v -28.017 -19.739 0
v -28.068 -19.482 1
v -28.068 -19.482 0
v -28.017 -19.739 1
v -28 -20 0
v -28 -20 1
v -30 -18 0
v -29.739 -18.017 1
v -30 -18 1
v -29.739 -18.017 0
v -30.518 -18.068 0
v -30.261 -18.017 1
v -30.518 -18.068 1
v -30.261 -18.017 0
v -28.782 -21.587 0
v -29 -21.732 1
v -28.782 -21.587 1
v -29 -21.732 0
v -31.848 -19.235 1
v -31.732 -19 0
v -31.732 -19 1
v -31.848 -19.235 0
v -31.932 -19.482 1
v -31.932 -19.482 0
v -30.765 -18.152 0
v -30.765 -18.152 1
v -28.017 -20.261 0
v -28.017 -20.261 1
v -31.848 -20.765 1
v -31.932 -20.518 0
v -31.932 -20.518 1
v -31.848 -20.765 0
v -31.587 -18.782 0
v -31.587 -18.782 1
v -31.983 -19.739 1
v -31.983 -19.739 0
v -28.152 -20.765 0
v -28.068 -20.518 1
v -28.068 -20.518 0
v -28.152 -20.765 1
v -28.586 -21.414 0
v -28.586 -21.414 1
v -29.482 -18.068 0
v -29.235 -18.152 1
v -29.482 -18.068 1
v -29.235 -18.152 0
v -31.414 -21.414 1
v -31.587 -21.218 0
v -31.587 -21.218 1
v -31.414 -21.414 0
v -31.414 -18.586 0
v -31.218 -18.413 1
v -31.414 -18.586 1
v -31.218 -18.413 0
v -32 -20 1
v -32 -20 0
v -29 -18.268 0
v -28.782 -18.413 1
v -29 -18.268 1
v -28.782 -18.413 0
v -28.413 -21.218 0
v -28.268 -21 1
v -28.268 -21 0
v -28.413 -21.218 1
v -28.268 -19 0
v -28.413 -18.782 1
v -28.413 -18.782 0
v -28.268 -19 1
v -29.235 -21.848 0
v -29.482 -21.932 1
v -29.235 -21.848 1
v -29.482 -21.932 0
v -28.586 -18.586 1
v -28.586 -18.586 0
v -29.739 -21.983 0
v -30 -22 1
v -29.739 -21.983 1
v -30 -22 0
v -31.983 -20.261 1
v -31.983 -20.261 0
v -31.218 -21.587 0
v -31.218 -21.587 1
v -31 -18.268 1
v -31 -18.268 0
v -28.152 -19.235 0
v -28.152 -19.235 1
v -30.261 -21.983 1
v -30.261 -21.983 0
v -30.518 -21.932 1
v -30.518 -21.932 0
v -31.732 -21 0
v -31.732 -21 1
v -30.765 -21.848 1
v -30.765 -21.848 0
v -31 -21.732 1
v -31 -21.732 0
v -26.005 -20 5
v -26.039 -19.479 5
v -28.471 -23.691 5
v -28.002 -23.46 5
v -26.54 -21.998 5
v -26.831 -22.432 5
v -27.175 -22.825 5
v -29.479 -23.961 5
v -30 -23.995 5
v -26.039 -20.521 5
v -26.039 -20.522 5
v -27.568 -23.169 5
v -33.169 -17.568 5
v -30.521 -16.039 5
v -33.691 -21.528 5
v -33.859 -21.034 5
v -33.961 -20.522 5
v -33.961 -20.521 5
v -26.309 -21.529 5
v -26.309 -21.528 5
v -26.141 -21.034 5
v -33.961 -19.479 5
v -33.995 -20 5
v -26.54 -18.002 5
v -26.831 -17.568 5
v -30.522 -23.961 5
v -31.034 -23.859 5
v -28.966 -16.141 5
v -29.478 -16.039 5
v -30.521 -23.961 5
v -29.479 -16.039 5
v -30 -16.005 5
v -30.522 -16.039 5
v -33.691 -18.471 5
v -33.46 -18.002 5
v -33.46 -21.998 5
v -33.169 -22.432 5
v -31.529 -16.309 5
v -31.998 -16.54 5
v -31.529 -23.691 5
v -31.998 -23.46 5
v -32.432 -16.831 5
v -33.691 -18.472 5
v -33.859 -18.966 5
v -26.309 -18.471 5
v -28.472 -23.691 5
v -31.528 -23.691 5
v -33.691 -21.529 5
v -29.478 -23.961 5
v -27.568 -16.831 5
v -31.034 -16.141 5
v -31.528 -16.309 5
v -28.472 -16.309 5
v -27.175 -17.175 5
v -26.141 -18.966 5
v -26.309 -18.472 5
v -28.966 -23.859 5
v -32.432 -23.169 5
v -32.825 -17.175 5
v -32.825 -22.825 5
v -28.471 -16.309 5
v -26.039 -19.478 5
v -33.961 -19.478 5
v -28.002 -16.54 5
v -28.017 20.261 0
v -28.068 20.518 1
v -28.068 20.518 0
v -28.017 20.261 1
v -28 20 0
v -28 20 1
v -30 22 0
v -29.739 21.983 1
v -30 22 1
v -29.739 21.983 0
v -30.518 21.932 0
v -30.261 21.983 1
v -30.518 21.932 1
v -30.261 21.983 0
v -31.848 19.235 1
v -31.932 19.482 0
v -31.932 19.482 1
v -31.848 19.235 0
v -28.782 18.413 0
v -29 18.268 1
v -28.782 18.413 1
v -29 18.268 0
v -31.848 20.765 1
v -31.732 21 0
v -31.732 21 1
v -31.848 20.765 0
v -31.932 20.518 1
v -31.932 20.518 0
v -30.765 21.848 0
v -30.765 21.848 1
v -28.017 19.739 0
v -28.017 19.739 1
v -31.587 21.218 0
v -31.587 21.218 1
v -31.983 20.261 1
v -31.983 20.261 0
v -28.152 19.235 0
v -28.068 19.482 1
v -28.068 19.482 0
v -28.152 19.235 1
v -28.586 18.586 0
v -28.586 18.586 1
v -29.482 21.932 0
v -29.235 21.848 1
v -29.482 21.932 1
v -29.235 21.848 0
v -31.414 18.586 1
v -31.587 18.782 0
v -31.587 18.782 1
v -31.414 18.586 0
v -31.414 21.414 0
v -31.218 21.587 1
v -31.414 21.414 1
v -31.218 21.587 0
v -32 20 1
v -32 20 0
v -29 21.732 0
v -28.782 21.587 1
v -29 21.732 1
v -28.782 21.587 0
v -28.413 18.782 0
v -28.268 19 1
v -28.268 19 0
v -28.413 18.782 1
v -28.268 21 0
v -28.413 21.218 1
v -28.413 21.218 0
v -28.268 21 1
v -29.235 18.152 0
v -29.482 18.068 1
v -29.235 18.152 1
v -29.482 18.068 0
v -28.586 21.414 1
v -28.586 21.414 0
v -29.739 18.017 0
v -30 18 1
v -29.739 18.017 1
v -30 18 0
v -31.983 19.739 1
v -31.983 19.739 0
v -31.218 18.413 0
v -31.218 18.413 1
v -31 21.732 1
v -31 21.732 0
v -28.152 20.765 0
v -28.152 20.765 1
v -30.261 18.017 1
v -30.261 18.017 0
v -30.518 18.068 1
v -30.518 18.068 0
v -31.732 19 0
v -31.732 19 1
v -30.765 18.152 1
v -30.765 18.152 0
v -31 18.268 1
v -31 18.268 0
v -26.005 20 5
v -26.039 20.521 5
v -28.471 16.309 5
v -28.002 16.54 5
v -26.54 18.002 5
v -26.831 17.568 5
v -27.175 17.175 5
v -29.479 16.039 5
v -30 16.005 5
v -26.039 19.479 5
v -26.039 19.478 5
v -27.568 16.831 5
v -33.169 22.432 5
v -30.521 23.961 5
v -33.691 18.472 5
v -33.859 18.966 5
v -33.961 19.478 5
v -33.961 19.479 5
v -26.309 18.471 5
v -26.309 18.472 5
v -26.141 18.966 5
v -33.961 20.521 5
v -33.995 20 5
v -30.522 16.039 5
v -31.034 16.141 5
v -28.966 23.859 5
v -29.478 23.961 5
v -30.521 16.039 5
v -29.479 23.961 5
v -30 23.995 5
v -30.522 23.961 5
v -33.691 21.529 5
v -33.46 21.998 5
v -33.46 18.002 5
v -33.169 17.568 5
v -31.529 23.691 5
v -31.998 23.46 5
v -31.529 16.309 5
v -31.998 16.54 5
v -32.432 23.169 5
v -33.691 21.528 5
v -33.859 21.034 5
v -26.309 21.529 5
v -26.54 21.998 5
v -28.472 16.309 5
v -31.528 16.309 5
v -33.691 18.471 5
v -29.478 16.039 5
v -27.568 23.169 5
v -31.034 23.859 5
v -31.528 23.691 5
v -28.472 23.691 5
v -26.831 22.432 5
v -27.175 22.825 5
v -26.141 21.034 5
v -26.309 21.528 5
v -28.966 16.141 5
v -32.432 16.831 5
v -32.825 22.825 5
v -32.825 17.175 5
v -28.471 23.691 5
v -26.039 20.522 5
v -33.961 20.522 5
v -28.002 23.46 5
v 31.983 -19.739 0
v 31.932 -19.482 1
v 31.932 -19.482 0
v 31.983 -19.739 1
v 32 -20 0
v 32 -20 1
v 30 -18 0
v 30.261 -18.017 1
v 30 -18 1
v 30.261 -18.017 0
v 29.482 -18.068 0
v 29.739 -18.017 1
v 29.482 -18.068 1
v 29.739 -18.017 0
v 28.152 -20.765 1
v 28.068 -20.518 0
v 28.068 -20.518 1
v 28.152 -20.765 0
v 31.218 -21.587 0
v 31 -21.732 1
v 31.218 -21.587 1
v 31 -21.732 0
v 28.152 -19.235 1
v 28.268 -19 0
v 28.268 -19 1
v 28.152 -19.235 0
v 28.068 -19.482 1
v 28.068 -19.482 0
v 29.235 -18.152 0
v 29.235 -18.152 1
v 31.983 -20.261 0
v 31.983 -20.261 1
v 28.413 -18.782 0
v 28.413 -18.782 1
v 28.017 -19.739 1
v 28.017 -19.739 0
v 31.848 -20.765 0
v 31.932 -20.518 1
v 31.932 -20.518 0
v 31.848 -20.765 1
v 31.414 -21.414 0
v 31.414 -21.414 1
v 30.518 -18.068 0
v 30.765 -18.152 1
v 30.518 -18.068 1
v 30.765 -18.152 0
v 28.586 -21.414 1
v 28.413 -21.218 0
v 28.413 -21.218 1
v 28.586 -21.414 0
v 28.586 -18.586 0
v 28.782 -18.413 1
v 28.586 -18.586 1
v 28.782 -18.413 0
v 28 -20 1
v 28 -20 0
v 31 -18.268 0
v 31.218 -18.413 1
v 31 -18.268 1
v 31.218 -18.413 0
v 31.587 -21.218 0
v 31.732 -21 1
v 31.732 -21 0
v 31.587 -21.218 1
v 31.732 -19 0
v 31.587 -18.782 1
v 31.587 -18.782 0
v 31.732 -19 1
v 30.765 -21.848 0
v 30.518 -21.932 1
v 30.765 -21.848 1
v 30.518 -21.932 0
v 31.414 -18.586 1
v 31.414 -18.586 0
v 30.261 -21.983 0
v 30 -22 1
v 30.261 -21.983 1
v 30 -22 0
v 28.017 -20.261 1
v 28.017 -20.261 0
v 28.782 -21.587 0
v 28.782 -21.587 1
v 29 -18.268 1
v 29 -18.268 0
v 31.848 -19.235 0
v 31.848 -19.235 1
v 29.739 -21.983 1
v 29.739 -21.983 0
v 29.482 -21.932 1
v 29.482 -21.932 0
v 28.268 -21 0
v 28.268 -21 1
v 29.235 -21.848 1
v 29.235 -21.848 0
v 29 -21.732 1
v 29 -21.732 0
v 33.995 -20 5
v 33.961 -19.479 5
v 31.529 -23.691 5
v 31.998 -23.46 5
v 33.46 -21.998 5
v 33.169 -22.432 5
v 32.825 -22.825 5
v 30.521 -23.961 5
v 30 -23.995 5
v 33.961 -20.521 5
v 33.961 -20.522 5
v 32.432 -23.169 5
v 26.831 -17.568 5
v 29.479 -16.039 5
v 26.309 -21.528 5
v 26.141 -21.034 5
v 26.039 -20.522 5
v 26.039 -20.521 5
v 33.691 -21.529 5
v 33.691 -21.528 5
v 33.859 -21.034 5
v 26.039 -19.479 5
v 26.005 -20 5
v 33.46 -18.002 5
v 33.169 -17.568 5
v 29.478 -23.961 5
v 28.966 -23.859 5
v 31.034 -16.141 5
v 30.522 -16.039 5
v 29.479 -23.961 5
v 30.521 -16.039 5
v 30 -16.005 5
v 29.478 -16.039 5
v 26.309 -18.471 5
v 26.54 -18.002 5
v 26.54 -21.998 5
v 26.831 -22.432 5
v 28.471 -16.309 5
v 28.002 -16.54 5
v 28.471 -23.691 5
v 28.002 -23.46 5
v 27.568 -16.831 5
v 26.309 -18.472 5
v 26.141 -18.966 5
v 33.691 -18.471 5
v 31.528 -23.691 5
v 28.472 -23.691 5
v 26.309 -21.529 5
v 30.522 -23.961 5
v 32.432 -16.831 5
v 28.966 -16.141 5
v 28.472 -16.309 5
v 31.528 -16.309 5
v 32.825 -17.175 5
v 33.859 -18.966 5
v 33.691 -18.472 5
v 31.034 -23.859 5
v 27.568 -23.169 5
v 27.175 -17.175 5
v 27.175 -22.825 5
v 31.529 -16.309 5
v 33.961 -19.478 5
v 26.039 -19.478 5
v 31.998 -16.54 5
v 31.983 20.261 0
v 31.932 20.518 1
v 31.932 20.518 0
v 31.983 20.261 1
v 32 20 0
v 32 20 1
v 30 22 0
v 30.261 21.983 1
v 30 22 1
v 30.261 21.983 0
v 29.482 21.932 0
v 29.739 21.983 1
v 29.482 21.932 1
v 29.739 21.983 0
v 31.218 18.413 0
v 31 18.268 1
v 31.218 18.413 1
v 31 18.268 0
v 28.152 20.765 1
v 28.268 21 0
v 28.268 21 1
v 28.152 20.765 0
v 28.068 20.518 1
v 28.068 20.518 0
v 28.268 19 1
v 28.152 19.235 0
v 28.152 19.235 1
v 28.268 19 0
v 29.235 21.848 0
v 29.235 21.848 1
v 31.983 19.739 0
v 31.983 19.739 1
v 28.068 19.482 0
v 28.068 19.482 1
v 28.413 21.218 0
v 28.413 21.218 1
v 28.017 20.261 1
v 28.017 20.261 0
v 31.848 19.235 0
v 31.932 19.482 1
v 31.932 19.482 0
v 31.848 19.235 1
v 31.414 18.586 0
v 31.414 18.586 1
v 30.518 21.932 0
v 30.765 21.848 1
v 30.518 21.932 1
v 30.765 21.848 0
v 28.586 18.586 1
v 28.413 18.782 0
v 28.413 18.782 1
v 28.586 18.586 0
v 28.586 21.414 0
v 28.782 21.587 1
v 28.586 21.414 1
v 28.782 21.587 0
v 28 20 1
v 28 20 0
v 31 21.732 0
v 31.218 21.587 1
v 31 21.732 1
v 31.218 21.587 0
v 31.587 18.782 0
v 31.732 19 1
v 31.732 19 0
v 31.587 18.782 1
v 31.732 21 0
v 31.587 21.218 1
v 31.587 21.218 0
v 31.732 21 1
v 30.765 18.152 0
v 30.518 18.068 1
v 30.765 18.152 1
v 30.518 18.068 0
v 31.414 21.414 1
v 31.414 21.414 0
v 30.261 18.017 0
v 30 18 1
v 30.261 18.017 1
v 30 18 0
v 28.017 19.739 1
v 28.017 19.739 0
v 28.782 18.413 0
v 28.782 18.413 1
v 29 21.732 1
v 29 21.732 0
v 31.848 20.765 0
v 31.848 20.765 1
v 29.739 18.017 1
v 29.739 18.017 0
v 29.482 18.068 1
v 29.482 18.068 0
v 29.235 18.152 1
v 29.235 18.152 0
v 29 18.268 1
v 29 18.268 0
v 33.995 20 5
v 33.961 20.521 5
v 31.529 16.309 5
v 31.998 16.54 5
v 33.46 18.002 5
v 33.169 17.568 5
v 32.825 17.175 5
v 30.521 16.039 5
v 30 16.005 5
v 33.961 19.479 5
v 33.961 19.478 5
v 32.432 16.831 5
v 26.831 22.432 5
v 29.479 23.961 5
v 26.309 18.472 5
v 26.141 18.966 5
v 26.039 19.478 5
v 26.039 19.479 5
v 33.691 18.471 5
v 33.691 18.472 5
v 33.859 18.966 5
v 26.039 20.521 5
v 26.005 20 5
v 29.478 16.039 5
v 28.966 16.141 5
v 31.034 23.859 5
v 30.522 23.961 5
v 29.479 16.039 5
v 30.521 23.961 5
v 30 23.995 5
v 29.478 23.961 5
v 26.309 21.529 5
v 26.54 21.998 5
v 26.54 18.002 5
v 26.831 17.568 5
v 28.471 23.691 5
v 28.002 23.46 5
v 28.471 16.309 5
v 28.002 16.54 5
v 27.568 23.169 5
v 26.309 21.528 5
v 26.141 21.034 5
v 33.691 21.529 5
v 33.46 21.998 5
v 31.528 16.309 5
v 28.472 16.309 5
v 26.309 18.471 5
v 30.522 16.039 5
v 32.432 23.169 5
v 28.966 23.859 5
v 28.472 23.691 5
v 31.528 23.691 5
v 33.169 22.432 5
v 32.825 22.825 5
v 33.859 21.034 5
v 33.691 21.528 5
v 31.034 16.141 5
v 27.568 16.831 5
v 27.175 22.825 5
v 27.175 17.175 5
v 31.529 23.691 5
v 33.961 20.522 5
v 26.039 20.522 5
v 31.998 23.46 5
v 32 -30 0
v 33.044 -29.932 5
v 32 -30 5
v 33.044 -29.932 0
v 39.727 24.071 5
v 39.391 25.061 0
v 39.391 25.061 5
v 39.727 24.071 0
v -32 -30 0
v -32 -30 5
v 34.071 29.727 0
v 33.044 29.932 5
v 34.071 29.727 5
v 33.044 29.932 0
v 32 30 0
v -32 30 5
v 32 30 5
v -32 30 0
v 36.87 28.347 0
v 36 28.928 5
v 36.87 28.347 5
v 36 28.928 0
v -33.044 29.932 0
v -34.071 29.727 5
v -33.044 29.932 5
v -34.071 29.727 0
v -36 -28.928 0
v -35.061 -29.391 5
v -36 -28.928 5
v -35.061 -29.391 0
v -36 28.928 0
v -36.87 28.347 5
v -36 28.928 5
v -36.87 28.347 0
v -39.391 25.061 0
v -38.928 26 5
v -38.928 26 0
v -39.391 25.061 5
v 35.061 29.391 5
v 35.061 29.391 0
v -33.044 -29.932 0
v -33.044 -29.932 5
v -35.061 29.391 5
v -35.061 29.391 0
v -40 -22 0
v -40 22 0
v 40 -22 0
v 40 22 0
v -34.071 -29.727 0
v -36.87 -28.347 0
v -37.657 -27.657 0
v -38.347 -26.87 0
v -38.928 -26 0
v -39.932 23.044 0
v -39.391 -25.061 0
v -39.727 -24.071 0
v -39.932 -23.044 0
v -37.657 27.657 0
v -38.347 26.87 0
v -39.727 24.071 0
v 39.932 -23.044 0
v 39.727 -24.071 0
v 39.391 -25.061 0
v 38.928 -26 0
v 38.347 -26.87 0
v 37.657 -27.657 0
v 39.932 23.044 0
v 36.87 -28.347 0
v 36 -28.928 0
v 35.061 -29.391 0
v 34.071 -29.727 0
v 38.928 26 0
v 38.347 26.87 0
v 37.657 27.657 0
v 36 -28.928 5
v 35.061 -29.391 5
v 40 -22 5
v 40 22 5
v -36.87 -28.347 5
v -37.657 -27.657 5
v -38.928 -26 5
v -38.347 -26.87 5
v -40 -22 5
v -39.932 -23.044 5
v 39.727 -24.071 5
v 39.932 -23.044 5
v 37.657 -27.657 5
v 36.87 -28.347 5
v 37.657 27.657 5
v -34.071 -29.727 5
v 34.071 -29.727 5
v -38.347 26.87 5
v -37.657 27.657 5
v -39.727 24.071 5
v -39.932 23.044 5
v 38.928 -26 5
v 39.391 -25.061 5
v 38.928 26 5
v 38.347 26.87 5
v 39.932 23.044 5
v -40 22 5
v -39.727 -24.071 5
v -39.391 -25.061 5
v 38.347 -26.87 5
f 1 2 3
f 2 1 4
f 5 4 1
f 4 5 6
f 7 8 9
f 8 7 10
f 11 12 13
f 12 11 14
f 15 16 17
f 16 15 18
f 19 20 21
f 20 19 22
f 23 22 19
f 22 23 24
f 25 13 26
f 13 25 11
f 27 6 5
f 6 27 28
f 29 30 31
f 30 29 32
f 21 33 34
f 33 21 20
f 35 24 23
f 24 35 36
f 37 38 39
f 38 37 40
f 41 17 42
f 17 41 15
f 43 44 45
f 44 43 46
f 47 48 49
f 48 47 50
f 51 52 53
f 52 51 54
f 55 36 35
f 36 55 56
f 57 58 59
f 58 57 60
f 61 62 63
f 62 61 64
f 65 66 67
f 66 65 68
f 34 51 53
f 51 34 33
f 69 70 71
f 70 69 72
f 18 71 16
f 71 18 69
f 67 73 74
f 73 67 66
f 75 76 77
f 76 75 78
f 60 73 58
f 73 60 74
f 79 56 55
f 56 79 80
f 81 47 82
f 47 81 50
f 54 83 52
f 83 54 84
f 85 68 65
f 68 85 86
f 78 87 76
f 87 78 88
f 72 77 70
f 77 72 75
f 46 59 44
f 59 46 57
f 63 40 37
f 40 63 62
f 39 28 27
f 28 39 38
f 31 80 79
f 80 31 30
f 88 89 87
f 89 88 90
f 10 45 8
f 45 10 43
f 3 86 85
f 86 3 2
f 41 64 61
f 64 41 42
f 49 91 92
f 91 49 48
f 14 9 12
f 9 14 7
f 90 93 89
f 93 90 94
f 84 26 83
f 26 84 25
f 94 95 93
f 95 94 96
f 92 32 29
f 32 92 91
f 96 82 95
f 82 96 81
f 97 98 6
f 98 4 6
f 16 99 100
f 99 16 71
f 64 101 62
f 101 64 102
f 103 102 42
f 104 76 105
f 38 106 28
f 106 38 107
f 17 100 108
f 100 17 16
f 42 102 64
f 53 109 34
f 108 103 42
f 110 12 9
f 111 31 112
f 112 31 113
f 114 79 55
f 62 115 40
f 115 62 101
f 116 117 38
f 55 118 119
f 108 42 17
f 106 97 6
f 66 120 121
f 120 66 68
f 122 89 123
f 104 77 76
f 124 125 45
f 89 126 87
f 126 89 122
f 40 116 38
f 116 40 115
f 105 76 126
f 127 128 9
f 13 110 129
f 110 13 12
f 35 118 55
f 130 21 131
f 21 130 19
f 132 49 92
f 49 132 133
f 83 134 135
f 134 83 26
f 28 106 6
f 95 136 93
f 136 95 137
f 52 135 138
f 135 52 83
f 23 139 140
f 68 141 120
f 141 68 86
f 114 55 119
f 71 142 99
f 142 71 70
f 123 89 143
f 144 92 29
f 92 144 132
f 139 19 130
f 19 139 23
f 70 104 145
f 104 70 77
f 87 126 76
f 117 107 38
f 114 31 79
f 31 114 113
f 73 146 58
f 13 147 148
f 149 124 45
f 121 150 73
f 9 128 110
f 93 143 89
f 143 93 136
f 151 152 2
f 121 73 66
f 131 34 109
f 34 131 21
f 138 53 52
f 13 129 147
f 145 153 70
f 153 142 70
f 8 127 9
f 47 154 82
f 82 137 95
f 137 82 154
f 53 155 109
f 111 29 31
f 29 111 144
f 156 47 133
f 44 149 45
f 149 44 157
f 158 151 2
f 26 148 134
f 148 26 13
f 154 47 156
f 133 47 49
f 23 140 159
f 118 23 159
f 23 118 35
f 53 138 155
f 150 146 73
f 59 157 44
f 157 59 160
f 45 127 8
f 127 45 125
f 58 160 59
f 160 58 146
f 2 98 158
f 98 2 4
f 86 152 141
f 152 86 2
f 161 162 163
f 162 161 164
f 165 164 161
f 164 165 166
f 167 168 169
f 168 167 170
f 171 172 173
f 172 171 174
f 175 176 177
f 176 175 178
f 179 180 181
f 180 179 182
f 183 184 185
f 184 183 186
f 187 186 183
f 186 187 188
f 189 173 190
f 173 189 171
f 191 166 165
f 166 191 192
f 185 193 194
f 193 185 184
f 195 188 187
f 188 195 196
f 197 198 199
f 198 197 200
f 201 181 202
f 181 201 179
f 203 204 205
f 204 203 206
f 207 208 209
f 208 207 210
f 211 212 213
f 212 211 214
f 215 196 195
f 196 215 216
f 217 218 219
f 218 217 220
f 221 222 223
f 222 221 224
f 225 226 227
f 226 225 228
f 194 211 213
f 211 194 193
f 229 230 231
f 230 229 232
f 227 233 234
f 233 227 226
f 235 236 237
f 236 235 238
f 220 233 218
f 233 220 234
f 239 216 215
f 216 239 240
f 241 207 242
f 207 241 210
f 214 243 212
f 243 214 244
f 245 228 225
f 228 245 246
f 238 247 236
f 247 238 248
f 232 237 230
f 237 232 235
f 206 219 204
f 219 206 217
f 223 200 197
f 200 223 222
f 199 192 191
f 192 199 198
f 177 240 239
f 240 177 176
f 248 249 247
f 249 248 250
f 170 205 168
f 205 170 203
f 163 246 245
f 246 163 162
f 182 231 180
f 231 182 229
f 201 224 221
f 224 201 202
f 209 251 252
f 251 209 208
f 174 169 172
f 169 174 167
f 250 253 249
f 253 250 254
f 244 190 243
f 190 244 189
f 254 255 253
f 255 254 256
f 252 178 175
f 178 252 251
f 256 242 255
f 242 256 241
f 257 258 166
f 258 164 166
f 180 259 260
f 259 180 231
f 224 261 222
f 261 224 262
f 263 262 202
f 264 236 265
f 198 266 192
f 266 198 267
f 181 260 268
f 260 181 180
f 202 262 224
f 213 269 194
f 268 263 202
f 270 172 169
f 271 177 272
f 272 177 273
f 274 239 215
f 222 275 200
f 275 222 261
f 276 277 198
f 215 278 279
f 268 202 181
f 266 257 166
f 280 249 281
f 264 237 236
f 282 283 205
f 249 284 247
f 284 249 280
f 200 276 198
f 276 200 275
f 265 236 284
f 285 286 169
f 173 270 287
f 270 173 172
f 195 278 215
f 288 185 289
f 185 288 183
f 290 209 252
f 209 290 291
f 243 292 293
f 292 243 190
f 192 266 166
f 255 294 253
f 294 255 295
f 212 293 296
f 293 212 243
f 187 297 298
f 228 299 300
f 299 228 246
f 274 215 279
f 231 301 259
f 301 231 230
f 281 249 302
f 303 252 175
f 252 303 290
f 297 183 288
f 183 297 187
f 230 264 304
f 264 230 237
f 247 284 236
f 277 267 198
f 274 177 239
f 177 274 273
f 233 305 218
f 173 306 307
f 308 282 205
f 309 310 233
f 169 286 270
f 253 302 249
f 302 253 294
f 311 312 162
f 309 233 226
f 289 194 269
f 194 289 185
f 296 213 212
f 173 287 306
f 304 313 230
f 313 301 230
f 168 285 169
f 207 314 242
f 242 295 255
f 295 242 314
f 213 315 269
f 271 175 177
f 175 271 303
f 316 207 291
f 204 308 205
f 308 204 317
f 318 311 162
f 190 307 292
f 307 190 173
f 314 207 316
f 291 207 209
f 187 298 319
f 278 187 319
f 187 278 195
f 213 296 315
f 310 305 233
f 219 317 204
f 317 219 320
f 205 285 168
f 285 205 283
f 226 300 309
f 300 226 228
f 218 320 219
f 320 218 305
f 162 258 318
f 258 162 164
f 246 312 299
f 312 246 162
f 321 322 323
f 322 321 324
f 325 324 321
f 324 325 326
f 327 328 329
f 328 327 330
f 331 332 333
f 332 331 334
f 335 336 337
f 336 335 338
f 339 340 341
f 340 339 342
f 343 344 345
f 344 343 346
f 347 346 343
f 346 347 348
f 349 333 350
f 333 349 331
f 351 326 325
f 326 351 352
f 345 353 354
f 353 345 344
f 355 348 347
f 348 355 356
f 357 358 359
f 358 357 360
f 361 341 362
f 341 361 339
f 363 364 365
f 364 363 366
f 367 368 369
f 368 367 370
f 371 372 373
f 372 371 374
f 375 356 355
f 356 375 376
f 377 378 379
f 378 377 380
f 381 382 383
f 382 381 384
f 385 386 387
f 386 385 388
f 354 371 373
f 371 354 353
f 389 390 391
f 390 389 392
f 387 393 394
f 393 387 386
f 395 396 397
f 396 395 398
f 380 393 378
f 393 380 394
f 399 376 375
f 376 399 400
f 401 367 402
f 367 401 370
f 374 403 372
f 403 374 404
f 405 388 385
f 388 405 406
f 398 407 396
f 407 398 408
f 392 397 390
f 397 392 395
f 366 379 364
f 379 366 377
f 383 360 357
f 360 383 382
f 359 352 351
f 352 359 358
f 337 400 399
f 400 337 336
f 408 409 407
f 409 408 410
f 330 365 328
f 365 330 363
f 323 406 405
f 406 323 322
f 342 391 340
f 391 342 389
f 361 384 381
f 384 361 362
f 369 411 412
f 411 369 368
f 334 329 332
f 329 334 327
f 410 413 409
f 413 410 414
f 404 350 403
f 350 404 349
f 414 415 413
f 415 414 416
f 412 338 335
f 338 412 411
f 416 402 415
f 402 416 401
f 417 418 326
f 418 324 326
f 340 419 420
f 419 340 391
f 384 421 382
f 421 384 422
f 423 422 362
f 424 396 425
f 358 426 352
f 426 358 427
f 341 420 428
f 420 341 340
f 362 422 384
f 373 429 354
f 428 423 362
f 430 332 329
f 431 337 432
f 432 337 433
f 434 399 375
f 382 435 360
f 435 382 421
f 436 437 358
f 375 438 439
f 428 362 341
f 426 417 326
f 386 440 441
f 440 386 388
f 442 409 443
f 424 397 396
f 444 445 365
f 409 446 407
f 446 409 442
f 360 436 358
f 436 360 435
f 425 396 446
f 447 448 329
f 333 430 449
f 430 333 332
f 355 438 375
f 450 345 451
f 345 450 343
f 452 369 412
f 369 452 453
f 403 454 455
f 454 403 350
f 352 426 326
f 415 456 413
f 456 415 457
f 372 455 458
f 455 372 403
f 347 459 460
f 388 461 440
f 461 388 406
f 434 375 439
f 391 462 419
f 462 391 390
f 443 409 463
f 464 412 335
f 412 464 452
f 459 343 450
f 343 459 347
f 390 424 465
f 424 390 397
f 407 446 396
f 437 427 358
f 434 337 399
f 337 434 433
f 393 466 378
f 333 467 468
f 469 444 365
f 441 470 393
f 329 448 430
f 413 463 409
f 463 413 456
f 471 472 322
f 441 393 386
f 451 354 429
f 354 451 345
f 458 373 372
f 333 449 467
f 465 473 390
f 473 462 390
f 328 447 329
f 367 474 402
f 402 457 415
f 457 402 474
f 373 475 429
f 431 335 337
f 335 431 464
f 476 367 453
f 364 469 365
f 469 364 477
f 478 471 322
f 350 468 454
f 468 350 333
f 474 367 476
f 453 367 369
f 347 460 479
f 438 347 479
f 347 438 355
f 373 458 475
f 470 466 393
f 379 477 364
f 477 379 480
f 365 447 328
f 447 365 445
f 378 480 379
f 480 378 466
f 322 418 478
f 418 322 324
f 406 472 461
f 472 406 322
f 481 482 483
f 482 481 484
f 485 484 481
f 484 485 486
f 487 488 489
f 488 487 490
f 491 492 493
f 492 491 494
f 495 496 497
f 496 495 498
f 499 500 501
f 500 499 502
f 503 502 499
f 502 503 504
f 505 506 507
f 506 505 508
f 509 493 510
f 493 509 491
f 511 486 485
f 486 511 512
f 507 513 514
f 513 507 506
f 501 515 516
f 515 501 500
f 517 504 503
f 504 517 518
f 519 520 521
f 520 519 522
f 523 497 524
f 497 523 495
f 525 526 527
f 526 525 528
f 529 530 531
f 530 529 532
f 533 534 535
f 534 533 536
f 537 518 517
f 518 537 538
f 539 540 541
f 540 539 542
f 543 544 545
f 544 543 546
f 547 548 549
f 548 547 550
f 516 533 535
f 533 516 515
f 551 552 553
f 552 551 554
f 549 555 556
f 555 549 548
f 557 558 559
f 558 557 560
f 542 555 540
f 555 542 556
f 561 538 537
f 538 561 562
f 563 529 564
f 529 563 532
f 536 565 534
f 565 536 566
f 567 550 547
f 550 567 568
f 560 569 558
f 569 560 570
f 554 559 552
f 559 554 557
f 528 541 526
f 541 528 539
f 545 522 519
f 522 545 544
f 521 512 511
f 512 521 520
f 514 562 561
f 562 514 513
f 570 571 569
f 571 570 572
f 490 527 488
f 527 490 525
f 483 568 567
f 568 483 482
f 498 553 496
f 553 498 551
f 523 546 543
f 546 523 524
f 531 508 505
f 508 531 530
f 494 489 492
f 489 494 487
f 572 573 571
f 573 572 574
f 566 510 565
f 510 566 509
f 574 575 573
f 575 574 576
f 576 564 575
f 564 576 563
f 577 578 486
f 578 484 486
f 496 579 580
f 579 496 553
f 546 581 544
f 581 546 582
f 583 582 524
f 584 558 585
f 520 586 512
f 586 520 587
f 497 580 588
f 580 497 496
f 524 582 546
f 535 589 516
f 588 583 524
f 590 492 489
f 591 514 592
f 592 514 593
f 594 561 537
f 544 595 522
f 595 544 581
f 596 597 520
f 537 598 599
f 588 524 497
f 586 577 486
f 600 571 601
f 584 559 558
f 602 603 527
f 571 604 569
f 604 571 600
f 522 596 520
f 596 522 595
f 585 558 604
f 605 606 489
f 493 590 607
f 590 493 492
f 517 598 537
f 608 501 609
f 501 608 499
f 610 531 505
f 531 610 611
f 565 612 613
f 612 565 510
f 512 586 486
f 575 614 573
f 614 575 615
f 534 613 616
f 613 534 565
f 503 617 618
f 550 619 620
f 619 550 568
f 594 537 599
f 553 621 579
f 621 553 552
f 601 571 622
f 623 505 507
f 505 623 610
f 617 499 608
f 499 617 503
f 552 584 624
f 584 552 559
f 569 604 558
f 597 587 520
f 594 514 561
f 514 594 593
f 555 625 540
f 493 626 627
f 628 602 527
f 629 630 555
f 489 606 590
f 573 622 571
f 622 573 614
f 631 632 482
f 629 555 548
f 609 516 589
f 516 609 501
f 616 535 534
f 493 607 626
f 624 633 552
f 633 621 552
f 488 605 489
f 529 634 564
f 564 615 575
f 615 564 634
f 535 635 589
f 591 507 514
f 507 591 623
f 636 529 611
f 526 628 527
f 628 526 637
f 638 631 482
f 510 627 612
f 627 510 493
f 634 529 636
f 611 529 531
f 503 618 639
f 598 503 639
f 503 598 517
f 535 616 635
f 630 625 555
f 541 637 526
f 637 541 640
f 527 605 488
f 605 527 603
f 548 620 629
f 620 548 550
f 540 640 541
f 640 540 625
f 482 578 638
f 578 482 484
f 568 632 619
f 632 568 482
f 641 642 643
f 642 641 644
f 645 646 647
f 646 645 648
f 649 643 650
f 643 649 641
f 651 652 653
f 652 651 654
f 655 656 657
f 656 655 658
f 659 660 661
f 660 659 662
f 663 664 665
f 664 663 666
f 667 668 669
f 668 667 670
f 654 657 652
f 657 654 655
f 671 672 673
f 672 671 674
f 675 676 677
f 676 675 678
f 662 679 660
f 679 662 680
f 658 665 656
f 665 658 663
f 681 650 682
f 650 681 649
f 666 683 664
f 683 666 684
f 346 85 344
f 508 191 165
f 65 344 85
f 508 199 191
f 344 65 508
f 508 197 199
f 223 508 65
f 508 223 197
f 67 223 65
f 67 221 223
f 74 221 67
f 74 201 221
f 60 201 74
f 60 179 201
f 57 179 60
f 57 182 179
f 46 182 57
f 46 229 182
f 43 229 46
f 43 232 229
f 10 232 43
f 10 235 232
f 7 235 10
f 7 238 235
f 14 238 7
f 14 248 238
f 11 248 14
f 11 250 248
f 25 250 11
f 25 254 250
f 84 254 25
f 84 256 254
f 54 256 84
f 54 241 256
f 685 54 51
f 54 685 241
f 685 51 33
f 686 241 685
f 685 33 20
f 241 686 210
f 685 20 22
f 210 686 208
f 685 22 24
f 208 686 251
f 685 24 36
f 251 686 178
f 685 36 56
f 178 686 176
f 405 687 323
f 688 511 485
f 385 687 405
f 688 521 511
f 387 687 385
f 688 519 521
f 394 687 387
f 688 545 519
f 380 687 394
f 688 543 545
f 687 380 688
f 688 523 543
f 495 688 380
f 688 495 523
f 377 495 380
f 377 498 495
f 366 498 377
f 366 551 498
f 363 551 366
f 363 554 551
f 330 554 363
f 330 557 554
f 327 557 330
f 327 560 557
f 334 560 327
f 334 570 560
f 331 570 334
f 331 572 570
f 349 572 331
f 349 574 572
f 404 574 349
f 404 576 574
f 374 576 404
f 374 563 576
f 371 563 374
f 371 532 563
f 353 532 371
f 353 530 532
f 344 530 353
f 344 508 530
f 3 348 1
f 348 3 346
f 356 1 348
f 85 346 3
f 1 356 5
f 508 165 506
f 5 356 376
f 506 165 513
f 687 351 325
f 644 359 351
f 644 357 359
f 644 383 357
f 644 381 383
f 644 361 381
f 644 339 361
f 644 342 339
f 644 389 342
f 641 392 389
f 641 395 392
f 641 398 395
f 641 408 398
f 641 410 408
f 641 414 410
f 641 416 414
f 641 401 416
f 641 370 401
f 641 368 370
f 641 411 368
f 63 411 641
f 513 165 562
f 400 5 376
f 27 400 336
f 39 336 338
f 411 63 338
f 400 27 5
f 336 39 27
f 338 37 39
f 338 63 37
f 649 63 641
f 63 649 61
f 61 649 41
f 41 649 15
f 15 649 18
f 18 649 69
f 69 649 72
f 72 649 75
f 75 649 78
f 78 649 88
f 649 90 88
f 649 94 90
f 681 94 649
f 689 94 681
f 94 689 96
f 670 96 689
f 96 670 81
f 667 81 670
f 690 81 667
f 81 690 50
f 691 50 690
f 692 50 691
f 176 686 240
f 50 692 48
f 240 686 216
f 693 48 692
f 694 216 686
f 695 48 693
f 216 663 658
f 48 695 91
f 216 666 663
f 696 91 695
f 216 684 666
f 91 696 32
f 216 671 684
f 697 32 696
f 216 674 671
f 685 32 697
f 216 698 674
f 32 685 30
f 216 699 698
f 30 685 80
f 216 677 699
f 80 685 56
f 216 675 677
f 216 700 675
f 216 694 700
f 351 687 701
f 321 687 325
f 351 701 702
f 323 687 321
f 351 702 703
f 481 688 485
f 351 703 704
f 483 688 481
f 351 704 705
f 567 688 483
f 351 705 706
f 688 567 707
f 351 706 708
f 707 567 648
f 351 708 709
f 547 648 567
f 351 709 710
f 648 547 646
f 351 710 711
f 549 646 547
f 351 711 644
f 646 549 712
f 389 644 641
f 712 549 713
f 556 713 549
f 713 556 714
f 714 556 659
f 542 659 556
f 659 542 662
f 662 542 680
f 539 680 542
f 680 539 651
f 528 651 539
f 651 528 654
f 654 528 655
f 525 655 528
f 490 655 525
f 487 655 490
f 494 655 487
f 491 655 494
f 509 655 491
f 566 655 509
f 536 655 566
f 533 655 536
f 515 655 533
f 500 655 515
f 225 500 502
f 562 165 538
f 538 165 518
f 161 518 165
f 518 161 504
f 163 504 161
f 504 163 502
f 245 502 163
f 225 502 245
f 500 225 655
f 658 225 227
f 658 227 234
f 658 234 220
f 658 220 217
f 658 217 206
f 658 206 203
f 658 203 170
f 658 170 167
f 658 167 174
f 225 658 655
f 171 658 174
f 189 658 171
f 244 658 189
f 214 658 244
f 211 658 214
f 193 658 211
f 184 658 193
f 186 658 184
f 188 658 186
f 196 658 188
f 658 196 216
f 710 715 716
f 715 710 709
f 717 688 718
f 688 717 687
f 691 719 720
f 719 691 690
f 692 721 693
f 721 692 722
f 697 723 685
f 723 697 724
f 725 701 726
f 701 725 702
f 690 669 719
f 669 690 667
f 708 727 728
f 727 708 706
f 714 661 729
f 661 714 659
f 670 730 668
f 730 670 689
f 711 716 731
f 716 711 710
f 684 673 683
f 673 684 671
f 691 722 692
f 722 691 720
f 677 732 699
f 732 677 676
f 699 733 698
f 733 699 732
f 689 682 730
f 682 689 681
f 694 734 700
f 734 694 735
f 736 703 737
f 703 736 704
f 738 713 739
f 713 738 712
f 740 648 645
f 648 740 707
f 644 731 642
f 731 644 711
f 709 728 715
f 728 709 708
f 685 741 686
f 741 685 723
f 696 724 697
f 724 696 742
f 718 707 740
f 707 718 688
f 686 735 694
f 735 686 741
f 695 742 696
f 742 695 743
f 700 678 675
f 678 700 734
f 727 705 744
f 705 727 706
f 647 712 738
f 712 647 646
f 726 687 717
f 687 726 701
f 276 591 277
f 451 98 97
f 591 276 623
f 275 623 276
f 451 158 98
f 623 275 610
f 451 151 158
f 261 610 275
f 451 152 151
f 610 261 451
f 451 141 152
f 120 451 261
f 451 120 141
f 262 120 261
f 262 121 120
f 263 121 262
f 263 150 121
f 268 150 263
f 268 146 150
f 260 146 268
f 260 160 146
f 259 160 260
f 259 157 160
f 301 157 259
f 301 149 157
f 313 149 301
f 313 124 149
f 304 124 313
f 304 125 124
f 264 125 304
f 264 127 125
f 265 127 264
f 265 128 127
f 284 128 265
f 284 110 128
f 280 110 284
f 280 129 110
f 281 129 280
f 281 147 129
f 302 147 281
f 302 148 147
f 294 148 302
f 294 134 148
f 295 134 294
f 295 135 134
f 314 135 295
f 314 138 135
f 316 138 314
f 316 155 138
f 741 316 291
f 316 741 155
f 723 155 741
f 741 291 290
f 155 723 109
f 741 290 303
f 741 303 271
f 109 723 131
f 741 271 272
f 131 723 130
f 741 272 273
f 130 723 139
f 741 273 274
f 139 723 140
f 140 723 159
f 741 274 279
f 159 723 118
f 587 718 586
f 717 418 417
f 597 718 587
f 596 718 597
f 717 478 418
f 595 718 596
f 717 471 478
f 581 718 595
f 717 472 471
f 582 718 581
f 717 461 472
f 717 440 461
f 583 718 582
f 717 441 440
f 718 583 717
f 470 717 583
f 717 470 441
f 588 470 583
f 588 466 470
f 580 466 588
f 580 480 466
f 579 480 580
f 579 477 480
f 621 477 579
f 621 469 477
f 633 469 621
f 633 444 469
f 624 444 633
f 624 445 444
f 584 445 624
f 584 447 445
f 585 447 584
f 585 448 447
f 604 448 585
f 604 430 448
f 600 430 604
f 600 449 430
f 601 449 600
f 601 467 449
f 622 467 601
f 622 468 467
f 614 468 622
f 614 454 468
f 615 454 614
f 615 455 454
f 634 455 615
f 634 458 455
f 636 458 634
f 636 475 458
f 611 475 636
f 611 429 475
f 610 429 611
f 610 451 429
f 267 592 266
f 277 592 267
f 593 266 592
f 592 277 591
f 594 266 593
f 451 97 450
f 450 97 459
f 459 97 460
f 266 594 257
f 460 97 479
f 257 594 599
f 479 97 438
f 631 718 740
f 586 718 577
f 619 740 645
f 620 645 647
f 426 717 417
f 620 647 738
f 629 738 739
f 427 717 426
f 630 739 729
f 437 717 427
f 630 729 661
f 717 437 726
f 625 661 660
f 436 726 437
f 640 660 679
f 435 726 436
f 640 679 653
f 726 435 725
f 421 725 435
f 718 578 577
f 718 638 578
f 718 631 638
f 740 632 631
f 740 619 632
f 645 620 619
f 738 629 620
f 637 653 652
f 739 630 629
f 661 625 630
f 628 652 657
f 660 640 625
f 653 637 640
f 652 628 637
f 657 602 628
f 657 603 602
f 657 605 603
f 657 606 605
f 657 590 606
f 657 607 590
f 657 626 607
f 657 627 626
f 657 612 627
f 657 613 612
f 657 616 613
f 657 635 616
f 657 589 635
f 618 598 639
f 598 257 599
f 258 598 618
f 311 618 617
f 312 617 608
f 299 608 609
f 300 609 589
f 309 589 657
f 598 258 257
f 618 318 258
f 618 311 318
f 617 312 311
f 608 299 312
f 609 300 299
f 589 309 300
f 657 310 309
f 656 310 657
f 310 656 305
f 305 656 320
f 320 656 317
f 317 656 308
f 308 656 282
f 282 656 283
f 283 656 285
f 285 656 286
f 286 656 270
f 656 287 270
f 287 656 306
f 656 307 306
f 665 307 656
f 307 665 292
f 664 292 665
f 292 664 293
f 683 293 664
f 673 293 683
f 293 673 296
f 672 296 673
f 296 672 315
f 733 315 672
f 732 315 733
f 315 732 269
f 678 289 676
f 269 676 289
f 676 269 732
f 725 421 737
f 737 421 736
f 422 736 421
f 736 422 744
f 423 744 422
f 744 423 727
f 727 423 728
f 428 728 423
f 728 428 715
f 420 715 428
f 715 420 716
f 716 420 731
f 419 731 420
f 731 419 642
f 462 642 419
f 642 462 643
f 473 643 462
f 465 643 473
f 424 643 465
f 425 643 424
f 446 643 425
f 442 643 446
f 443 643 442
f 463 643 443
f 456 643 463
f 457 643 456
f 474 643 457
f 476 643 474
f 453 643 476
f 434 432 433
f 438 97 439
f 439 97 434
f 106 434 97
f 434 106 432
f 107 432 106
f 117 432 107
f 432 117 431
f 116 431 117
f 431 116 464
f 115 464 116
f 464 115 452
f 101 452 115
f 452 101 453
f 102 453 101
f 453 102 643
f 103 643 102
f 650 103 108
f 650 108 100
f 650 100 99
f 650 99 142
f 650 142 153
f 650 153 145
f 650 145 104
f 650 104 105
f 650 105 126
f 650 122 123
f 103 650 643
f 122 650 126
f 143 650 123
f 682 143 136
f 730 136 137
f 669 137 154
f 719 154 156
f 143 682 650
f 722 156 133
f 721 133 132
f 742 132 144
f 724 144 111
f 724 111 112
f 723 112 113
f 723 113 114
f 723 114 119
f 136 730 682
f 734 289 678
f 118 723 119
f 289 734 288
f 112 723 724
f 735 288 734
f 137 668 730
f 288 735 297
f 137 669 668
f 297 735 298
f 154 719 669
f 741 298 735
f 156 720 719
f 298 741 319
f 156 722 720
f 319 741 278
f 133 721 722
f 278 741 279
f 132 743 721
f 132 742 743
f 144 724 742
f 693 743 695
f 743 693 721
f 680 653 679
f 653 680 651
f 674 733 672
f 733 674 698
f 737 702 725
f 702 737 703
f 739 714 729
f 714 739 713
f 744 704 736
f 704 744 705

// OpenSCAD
// Rounded mounting plate - a flat plate with rounded corners and a countersunk screw hole near each
// corner. Teaches 2D corner rounding with offset() and a countersink (chamfered hole). NOVEL part.
//
// @desc flat plate, rounded corners, countersunk holes
// @prompt Design a mounting plate in OpenSCAD: {L} by {W} mm and {t} mm thick, with {r} mm rounded corners and a countersunk hole for an {screw} mm screw near each corner. Reply with a single complete OpenSCAD file.
// @param L     length, mm           [40:120]
// @param W     width, mm            [30:90]
// @param t     thickness, mm        [3:8]
// @param r     corner radius, mm    [3:12]
// @param screw screw diameter, mm   [3:6]

L     = 80;
W     = 60;
t     = 5;
r     = 8;
screw = 4;

$fn = 48;

inset = r + 2;                     // hole-centre inset from the edges
head  = screw * 2;                 // countersink top diameter
csk   = min(screw, t - 1);         // countersink depth

module rounded_rect(l, w, rad) {
    offset(r = rad) square([l - 2 * rad, w - 2 * rad], center = true);
}

difference() {
    linear_extrude(t) rounded_rect(L, W, r);
    for (sx = [-1, 1], sy = [-1, 1])
        translate([sx * (L / 2 - inset), sy * (W / 2 - inset), 0]) {
            translate([0, 0, -1]) cylinder(h = t + 2, d = screw);                       // shank
            translate([0, 0, t - csk]) cylinder(h = csk + 0.01, d1 = screw, d2 = head); // countersink
        }
}
